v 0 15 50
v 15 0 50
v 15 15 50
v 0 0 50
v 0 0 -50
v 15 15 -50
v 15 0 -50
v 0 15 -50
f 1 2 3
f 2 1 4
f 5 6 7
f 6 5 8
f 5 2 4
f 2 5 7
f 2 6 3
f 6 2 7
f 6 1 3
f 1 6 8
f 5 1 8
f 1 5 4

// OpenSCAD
$fn=64;

module extrusion_15x15(length=100, size=15) {
    translate([0,0,-length/2])
        cube([size,size,length], center=false);
}

extrusion_15x15(100,15);
